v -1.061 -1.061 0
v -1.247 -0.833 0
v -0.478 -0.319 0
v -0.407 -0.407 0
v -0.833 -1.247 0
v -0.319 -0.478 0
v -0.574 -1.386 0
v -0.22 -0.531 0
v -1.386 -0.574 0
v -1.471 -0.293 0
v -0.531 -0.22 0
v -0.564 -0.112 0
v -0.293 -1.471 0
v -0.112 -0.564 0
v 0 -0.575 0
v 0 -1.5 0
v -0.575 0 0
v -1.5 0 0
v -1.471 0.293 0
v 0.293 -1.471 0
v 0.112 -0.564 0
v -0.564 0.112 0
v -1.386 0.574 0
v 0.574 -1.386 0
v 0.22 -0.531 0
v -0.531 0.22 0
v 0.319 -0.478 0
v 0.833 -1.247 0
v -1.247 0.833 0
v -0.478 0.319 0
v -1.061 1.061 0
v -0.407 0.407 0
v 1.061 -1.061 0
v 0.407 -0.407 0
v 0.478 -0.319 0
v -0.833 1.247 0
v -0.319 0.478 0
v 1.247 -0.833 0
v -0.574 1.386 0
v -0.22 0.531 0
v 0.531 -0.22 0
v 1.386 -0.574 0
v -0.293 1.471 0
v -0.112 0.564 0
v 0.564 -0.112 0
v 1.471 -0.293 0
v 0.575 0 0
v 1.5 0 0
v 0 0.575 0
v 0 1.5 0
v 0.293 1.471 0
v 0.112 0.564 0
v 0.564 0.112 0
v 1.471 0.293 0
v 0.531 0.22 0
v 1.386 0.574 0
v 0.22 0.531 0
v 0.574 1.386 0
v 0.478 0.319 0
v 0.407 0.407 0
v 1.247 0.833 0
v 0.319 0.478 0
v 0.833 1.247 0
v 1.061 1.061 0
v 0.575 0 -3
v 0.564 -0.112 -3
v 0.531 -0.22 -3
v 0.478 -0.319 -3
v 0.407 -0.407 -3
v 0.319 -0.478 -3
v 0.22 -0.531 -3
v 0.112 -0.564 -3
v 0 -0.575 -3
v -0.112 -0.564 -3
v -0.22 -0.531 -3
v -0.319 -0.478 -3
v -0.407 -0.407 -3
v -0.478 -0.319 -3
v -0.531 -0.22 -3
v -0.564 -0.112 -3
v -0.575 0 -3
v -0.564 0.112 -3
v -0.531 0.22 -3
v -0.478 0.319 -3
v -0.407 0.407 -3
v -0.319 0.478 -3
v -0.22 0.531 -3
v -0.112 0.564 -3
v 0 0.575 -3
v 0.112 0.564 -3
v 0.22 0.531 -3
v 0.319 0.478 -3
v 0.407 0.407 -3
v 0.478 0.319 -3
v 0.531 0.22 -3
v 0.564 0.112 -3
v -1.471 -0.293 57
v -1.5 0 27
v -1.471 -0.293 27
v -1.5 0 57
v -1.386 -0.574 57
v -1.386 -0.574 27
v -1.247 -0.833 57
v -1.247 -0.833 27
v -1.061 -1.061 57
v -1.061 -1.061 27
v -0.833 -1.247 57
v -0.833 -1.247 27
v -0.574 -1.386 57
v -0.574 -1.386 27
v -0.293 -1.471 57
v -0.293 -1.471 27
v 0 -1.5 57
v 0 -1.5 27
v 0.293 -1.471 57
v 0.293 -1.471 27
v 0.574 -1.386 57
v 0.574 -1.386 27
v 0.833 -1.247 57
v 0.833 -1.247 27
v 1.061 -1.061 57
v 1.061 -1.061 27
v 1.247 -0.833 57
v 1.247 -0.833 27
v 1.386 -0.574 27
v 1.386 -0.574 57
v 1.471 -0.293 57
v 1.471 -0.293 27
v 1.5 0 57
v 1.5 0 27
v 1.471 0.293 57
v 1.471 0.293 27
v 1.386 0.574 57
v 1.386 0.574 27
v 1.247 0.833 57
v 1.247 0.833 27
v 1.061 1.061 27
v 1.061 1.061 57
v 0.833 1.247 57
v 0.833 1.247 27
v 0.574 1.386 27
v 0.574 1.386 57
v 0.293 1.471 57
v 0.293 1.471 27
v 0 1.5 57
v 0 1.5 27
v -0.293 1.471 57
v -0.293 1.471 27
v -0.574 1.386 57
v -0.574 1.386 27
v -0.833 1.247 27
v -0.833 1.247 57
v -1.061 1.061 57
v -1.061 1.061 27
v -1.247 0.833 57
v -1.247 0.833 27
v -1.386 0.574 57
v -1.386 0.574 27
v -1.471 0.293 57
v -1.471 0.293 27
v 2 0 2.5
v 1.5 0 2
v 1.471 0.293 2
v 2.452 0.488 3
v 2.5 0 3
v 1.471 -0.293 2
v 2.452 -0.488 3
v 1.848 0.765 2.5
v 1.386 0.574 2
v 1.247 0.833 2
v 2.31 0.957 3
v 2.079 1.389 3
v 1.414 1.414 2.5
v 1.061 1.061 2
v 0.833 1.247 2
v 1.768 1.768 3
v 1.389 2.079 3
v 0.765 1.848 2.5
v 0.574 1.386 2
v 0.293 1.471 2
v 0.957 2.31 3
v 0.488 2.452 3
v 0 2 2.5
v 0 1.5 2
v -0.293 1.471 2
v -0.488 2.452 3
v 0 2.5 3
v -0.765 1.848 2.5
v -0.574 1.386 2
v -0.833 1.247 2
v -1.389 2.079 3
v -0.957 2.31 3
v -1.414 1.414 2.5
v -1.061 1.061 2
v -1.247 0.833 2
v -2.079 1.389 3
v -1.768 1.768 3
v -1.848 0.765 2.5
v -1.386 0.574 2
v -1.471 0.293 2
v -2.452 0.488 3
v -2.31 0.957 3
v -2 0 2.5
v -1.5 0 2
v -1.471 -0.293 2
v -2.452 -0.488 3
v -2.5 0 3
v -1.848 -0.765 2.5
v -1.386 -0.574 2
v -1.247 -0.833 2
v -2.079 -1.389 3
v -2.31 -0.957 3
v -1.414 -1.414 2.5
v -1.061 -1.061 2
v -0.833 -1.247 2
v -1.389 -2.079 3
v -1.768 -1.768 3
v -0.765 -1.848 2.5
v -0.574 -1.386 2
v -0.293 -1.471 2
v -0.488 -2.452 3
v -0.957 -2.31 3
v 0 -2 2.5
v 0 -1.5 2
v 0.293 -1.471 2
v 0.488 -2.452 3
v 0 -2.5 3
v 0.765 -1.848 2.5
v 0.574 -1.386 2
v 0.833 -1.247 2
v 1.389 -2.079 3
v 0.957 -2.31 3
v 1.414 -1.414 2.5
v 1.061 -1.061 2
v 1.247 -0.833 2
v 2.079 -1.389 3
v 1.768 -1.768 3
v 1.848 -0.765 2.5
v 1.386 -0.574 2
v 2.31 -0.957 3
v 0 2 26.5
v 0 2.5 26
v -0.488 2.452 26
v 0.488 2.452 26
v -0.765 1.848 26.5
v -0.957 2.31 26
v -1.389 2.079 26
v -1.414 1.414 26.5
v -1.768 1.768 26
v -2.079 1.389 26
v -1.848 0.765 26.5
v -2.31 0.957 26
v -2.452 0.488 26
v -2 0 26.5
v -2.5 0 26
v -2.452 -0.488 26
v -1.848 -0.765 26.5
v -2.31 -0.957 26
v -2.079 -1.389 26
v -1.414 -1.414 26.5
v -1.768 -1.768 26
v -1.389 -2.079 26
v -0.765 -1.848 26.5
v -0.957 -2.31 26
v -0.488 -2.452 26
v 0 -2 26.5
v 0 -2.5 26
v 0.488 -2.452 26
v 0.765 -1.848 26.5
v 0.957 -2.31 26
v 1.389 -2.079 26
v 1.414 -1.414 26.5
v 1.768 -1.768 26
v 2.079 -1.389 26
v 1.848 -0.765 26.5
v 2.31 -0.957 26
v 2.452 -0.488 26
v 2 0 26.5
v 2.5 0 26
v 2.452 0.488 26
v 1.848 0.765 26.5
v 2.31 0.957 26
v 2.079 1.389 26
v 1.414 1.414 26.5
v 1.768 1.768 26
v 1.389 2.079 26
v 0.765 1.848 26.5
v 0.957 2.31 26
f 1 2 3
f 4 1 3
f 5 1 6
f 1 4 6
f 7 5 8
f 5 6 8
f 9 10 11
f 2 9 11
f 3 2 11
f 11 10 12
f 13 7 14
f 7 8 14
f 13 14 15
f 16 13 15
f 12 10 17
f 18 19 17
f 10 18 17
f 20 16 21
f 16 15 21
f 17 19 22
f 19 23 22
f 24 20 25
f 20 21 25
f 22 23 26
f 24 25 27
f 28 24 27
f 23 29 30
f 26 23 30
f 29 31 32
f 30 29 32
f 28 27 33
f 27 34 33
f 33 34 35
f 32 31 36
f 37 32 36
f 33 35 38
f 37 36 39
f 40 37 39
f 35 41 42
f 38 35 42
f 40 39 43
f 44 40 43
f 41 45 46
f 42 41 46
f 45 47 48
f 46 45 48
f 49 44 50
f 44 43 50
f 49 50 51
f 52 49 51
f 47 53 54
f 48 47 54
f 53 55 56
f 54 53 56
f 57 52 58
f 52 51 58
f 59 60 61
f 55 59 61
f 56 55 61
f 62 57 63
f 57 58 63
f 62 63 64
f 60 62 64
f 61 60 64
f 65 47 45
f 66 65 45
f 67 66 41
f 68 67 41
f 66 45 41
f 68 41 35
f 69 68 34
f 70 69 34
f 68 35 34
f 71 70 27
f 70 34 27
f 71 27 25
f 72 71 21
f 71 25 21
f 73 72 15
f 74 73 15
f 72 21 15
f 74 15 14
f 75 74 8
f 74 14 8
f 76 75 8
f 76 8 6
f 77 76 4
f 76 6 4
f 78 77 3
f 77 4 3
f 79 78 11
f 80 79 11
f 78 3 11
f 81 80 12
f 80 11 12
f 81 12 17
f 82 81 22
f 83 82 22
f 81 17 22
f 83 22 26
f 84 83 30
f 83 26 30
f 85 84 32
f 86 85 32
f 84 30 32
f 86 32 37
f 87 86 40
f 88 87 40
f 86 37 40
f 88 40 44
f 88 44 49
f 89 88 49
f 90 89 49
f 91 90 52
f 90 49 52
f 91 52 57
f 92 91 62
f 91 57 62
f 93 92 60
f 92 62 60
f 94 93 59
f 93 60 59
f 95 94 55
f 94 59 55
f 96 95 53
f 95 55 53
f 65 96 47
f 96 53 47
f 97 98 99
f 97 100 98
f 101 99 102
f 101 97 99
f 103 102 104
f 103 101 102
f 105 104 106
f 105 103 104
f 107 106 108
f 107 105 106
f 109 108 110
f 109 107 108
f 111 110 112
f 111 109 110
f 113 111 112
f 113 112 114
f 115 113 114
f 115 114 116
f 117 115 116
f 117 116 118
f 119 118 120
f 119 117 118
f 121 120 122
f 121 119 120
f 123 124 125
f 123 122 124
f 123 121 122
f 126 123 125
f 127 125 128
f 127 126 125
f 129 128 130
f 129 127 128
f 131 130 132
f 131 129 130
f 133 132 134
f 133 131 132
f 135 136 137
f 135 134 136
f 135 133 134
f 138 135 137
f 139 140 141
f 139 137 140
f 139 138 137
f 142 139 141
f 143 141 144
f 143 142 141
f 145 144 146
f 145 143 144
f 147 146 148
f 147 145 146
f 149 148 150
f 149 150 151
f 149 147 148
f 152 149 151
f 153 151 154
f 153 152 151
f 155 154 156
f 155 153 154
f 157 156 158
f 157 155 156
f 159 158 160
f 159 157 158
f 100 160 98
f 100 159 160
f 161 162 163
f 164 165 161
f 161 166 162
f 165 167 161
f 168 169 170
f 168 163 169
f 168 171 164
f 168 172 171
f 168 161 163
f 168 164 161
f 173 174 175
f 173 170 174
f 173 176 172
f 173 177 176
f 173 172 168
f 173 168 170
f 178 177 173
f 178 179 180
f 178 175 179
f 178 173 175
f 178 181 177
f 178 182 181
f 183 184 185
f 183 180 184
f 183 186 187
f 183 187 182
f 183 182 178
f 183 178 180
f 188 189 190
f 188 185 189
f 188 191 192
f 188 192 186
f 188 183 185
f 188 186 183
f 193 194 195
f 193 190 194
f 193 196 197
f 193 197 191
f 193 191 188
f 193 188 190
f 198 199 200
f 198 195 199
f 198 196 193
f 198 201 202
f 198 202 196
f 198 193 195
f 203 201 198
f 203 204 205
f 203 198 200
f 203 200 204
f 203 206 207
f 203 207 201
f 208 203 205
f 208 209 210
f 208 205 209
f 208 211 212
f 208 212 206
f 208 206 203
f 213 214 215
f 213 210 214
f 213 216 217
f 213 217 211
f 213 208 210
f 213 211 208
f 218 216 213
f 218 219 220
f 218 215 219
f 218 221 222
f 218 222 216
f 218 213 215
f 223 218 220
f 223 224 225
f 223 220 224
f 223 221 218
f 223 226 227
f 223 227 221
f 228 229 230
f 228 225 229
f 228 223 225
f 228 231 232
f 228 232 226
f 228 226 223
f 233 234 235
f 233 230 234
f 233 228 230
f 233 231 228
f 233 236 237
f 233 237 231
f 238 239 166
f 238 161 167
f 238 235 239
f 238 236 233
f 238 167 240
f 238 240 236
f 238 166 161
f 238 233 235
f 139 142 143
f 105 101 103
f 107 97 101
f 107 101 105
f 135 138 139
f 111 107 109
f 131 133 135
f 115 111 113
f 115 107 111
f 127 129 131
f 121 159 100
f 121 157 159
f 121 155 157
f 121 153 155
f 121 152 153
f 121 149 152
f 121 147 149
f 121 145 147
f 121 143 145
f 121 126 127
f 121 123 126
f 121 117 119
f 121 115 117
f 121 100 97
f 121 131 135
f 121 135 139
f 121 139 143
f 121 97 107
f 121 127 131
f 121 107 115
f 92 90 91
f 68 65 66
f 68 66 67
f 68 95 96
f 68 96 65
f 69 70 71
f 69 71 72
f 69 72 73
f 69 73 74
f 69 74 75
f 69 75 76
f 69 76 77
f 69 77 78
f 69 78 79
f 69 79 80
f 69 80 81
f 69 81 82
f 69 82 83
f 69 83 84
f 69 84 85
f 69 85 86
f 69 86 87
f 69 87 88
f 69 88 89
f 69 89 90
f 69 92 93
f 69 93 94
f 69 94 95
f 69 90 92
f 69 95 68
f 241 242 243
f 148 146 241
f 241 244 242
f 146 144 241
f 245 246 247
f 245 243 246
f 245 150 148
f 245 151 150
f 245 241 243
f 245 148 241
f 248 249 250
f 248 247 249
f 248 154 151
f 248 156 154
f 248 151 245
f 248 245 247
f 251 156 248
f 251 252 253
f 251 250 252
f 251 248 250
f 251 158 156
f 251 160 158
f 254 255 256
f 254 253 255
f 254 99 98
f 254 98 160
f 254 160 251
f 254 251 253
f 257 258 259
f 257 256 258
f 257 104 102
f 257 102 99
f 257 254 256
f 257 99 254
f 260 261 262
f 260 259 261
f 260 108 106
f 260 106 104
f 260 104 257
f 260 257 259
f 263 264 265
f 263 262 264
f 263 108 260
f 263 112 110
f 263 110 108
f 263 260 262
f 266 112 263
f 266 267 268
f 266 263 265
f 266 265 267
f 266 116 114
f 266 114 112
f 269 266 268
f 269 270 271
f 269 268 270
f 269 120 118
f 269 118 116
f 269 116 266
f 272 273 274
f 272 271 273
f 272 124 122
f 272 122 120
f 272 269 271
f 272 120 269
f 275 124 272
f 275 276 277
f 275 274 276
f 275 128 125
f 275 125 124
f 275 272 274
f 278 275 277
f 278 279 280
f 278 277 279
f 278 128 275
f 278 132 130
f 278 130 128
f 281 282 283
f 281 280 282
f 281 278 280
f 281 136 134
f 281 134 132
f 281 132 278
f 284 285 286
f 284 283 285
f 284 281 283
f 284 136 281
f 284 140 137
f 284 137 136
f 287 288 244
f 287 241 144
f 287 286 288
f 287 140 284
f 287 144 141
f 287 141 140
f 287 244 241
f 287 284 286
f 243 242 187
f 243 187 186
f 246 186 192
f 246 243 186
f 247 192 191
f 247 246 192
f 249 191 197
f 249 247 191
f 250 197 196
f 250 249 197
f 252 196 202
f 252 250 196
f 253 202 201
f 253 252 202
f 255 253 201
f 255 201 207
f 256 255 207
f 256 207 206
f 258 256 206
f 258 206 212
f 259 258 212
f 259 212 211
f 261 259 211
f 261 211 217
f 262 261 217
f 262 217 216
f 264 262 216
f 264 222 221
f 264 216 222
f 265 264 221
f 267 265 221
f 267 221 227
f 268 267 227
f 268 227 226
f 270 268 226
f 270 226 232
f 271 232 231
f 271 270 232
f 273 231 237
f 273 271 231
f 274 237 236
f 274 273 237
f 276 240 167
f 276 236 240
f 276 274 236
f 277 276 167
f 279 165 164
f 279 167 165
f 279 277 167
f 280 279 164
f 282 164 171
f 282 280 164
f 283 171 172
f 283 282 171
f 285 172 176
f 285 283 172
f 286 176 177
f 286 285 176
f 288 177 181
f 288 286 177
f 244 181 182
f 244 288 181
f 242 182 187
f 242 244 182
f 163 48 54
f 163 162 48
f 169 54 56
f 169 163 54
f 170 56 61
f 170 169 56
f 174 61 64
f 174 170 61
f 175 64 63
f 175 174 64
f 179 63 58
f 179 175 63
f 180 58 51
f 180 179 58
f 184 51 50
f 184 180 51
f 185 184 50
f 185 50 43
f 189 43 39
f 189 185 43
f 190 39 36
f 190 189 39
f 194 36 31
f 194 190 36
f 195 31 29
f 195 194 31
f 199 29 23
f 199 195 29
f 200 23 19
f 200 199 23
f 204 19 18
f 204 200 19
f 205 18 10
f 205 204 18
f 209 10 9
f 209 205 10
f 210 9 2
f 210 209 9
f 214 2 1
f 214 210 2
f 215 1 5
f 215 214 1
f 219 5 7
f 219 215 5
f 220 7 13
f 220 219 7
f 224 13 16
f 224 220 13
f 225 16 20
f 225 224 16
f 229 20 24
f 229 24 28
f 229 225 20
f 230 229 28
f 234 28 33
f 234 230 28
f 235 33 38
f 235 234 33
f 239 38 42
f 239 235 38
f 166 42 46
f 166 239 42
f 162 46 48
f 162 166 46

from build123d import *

# Parameters (mm, degrees)
SKETCH_R    = 1.5
SKETCH001_R = 1.5
SKETCH002_R = 2.5
SKETCH003_R = 2.5
SKETCH004_R = 1.5
SKETCH005_R = 1.5
SKETCH006_R = 0.575
PAD_DEPTH   = 3


with BuildPart() as part:
    # Sketch → AdditiveLoft section 0
    with BuildSketch(Plane.XY):
        Circle(SKETCH_R)
    # Sketch001 (on DatumPlane) → AdditiveLoft section 1
    with BuildSketch(Plane.XY.offset(2)):
        Circle(SKETCH001_R)
    # Sketch002 (on DatumPlane) → AdditiveLoft section 2
    with BuildSketch(Plane(origin=(0, 0, 3), x_dir=(0, 1, 0), z_dir=(0, 0, 1))):
        Circle(SKETCH002_R)
    # Sketch003 (on DatumPlane) → AdditiveLoft section 3
    with BuildSketch(Plane(origin=(0, 0, 26), x_dir=(0, 1, 0), z_dir=(0, 0, 1))):
        Circle(SKETCH003_R)
    # Sketch004 (on DatumPlane) → AdditiveLoft section 4
    with BuildSketch(Plane(origin=(0, 0, 27), x_dir=(-1, 0, 0), z_dir=(0, 0, 1))):
        Circle(SKETCH004_R)
    # Sketch005 (on DatumPlane) → AdditiveLoft section 5
    with BuildSketch(Plane(origin=(0, 0, 57), x_dir=(0, -1, 0), z_dir=(0, 0, 1))):
        Circle(SKETCH005_R)
    loft(ruled=True)

    # Sketch006 (on Face1 of AdditiveLoft) → Pad (new body)
    with BuildSketch(Plane(origin=(0, 0, 0), x_dir=(1, 0, 0), z_dir=(0, 0, -1))):
        Circle(SKETCH006_R)
    extrude(amount=PAD_DEPTH)


solid = part.part
